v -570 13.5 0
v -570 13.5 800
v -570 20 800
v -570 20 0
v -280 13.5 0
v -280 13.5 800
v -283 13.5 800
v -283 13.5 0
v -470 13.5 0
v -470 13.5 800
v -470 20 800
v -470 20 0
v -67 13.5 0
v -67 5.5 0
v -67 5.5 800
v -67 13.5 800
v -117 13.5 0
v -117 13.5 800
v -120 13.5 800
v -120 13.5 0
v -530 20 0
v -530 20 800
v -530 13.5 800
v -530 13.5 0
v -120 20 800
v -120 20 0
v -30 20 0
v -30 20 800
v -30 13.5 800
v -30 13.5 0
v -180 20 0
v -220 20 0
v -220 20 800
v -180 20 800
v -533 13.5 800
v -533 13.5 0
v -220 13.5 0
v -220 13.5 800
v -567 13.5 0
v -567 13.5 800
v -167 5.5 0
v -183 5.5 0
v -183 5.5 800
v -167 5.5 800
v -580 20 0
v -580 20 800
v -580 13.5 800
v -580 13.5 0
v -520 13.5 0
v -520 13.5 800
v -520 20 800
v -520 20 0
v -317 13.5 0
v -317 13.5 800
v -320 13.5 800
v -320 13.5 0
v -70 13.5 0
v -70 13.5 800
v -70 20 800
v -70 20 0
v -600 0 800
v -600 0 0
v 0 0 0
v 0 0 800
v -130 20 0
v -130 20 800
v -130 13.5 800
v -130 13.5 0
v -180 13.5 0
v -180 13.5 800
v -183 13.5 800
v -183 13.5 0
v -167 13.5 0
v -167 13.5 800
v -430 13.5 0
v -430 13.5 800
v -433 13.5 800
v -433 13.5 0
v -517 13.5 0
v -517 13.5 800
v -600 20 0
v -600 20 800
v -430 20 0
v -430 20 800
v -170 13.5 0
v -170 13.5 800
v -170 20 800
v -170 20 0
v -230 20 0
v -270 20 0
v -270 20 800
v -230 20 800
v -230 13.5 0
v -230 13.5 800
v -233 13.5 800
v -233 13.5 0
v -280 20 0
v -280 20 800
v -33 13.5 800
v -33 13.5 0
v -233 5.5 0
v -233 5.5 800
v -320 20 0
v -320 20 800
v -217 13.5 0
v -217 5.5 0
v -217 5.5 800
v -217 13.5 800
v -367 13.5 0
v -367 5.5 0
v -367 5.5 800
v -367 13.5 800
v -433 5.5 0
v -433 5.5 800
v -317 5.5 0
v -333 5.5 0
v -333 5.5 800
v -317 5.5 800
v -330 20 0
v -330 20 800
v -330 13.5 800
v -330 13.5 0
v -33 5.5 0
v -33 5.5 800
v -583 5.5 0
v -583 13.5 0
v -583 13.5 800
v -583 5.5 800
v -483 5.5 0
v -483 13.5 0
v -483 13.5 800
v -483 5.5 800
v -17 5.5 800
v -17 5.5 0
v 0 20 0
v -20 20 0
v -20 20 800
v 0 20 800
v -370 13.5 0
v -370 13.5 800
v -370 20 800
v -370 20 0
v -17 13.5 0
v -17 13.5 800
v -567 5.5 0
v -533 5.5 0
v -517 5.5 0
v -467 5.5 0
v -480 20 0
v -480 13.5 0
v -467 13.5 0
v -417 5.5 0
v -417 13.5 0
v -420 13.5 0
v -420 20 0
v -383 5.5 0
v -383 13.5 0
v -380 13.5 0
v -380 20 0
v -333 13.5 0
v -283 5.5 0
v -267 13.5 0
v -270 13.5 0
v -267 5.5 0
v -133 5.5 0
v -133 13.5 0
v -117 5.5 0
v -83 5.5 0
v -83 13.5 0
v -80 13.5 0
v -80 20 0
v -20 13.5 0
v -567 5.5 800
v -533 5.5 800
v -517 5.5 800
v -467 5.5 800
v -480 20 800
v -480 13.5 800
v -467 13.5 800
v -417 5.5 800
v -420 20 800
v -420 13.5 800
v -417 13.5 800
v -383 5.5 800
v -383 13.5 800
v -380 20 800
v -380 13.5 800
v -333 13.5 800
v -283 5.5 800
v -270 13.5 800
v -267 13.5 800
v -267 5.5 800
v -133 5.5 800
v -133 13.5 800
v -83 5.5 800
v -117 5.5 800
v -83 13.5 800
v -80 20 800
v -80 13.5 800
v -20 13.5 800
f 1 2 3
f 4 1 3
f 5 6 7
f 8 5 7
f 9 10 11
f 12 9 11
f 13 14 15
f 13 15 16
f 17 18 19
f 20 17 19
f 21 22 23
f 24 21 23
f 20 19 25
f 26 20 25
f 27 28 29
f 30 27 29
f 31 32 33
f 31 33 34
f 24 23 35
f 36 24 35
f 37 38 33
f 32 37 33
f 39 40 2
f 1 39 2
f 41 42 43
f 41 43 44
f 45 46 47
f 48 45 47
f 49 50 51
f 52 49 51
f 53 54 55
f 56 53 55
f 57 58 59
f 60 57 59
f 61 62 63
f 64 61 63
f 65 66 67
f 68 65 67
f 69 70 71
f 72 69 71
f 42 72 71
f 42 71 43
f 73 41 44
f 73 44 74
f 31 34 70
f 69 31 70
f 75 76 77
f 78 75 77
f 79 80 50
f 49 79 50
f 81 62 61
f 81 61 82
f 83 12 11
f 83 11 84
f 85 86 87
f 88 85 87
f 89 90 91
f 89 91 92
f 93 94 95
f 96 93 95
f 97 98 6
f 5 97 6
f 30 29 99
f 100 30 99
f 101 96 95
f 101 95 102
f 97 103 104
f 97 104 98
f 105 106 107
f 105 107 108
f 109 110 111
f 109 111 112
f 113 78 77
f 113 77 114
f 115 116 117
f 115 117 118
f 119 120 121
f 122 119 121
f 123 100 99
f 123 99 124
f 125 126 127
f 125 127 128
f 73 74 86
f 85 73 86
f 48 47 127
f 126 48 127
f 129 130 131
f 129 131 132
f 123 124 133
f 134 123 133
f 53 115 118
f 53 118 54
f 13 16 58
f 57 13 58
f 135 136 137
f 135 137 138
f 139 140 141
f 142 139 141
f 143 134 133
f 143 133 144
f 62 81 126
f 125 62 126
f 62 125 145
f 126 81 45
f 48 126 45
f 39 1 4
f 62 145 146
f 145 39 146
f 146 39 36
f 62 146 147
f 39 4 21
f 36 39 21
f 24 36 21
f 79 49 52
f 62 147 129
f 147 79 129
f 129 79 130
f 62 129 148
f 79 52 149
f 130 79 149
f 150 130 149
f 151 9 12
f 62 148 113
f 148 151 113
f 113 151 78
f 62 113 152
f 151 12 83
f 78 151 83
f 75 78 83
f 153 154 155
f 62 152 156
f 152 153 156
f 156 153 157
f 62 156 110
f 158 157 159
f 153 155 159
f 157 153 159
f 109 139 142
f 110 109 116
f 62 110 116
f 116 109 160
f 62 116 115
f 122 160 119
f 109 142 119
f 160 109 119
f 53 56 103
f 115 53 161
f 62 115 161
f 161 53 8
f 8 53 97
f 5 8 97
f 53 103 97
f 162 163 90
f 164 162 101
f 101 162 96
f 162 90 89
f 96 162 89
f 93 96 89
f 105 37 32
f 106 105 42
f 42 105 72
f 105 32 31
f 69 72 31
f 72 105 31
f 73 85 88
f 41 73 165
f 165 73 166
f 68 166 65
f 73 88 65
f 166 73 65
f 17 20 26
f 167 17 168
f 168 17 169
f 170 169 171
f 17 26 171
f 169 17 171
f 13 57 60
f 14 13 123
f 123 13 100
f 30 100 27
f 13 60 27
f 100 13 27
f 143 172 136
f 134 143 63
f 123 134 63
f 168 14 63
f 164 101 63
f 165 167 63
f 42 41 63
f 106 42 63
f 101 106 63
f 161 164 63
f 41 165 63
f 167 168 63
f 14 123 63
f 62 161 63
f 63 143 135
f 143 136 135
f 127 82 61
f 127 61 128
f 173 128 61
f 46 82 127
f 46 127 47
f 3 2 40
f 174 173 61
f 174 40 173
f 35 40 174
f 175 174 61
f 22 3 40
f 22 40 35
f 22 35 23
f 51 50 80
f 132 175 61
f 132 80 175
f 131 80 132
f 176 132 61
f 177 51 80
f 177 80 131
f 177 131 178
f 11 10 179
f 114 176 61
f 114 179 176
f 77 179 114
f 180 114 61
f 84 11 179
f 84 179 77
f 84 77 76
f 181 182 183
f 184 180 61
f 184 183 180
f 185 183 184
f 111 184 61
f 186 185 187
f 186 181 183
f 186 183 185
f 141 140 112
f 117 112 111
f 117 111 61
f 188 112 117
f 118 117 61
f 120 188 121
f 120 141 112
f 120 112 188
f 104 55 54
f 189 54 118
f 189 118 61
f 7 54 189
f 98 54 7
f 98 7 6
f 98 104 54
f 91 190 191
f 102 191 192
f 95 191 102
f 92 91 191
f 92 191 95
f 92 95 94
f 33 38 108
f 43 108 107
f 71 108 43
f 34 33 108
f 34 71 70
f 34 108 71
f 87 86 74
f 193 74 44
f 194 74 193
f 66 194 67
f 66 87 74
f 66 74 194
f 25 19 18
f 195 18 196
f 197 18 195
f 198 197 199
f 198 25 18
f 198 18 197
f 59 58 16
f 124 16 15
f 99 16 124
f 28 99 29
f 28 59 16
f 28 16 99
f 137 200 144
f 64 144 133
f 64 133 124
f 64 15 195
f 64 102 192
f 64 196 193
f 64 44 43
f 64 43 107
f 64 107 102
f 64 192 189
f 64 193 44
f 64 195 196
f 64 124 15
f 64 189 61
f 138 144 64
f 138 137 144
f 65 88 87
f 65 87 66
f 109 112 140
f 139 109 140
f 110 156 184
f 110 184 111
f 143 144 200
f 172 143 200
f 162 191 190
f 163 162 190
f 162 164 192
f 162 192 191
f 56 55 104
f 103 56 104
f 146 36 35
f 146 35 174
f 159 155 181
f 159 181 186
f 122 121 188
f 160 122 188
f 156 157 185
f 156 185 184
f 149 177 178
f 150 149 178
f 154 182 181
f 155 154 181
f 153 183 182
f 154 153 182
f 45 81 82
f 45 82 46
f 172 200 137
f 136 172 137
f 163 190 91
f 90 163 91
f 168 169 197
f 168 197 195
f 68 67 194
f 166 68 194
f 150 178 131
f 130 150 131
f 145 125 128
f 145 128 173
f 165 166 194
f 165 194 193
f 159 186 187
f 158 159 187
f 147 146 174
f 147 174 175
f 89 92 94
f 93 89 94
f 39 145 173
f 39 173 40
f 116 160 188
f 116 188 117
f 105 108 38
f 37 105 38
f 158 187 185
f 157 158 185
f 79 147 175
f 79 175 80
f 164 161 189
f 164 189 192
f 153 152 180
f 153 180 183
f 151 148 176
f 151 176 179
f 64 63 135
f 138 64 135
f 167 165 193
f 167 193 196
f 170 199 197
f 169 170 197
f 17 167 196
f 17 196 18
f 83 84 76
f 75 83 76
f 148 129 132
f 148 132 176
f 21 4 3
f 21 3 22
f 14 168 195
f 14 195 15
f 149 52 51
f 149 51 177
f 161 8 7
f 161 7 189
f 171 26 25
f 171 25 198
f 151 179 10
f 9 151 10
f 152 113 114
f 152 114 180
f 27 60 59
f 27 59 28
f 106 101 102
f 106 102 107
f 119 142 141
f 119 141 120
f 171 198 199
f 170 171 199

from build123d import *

# Parameters (mm, degrees)
SKETCH1_W           = 600
SKETCH1_H           = 20
BOSS_EXTRUDE1_DEPTH = 800
CUT_EXTRUDE1_DEPTH  = 1001.199980004


with BuildPart() as part:
    # Sketch1 → Boss-Extrude1 (new body)
    with BuildSketch(Plane.XY):
        with Locations((-300, 10)):
            Rectangle(SKETCH1_W, SKETCH1_H)
    extrude(amount=BOSS_EXTRUDE1_DEPTH)

    # Sketch2 → Cut-Extrude1 (cut, through all)
    with BuildSketch(Plane.XY.offset(800)):
        Polygon((-580, 20), (-580, 13.5), (-583, 13.5), (-583, 5.5), (-567, 5.5), (-567, 13.5), (-570, 13.5), (-570, 20), align=None)
        Polygon((-530, 20), (-530, 13.5), (-533, 13.5), (-533, 5.5), (-517, 5.5), (-517, 13.5), (-520, 13.5), (-520, 20), align=None)
        Polygon((-480, 20), (-480, 13.5), (-483, 13.5), (-483, 5.5), (-467, 5.5), (-467, 13.5), (-470, 13.5), (-470, 20), align=None)
        Polygon((-430, 20), (-430, 13.5), (-433, 13.5), (-433, 5.5), (-417, 5.5), (-417, 13.5), (-420, 13.5), (-420, 20), align=None)
        Polygon((-380, 20), (-380, 13.5), (-383, 13.5), (-383, 5.5), (-367, 5.5), (-367, 13.5), (-370, 13.5), (-370, 20), align=None)
        Polygon((-330, 20), (-330, 13.5), (-333, 13.5), (-333, 5.5), (-317, 5.5), (-317, 13.5), (-320, 13.5), (-320, 20), align=None)
        Polygon((-280, 20), (-280, 13.5), (-283, 13.5), (-283, 5.5), (-267, 5.5), (-267, 13.5), (-270, 13.5), (-270, 20), align=None)
        Polygon((-230, 20), (-230, 13.5), (-233, 13.5), (-233, 5.5), (-217, 5.5), (-217, 13.5), (-220, 13.5), (-220, 20), align=None)
        Polygon((-180, 20), (-180, 13.5), (-183, 13.5), (-183, 5.5), (-167, 5.5), (-167, 13.5), (-170, 13.5), (-170, 20), align=None)
        Polygon((-130, 20), (-130, 13.5), (-133, 13.5), (-133, 5.5), (-117, 5.5), (-117, 13.5), (-120, 13.5), (-120, 20), align=None)
        Polygon((-80, 20), (-80, 13.5), (-83, 13.5), (-83, 5.5), (-67, 5.5), (-67, 13.5), (-70, 13.5), (-70, 20), align=None)
        Polygon((-30, 20), (-30, 13.5), (-33, 13.5), (-33, 5.5), (-17, 5.5), (-17, 13.5), (-20, 13.5), (-20, 20), align=None)
    extrude(amount=-CUT_EXTRUDE1_DEPTH, mode=Mode.SUBTRACT)


solid = part.part
